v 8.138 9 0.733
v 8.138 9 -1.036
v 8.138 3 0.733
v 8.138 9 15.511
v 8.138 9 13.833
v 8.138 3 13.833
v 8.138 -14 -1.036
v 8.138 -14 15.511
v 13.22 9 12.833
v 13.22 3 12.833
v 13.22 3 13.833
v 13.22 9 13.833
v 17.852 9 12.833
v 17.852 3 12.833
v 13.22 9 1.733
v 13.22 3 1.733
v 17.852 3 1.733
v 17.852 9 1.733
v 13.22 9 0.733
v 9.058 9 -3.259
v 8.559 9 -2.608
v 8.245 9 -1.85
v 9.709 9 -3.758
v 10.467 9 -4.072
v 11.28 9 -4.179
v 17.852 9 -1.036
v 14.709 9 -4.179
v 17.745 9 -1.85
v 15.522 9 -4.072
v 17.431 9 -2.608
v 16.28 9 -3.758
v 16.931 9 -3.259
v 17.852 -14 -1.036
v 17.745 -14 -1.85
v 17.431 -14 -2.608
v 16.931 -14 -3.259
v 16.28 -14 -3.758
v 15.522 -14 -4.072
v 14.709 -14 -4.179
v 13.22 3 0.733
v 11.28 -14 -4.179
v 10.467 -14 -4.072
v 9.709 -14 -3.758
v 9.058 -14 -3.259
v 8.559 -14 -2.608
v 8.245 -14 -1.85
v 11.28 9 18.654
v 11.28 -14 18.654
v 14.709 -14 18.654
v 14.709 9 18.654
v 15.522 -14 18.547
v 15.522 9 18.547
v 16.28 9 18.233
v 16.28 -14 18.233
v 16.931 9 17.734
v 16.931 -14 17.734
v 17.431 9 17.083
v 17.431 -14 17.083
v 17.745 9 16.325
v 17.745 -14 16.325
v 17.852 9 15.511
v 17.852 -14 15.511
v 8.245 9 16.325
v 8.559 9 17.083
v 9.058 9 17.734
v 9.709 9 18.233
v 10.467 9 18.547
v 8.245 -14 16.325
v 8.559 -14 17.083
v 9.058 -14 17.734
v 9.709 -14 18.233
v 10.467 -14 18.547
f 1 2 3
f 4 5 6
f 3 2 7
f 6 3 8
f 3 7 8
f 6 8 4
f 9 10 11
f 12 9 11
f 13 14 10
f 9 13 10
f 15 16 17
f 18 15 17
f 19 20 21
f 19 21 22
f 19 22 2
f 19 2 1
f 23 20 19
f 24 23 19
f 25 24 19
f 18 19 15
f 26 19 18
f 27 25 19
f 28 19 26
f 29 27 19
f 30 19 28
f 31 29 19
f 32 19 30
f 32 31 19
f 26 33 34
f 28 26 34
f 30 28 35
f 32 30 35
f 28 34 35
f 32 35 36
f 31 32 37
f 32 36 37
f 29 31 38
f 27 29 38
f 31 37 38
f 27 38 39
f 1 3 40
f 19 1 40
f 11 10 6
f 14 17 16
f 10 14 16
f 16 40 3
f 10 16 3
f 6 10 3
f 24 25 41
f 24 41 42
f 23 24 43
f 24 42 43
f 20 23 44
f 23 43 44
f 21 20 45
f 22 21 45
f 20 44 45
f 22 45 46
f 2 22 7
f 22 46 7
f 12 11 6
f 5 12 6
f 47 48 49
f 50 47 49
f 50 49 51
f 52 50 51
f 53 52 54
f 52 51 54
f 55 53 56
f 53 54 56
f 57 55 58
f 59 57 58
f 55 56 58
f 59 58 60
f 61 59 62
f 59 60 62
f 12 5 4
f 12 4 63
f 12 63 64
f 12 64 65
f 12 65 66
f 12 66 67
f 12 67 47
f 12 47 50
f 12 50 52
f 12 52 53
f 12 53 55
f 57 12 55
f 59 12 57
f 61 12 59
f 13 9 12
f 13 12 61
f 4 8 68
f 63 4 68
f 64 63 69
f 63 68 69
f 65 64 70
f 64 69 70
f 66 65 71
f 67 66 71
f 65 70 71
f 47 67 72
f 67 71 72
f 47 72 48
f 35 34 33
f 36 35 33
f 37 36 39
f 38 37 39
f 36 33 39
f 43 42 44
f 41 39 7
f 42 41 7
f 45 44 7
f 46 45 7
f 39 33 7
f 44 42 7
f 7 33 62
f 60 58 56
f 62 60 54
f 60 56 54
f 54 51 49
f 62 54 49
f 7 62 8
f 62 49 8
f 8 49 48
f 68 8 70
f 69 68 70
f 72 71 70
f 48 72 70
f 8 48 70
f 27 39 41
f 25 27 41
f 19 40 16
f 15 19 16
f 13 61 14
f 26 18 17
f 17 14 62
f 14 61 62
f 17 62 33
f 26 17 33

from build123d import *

# Parameters (mm, degrees)
CROQUIS1_R                 = 2.4
SALIENTE_EXTRUIR1_DEPTH    = 3
SALIENTE_EXTRUIR2_DEPTH    = 6
CORTAR_EXTRUIR4_DEPTH      = 48.064644057
CORTAR_EXTRUIR4_DEPTH_BACK = 3
SALIENTE_EXTRUIR3_START    = 14
SALIENTE_EXTRUIR3_DEPTH    = 14


with BuildPart() as part:
    # Croquis1 → Saliente-Extruir1 (new body)
    with BuildSketch(Plane(origin=(0, 0, 0), x_dir=(1, 0, 0), z_dir=(0, 1, 0))):
        with BuildLine():
            Line((35.117506554, -10.768616799), (17.851894103, -10.768616799))
            Line((17.851894103, -10.768616799), (17.851894103, -15.511473942))
            ThreePointArc((17.851894103, -15.511473942), (16.931372558, -17.73380954), (14.70903696, -18.654331085))
            Line((14.70903696, -18.654331085), (11.280465531, -18.654331085))
            ThreePointArc((11.280465531, -18.654331085), (9.058129933, -17.73380954), (8.137608389, -15.511473942))
            Line((8.137608389, -15.511473942), (8.137608389, 1.036415275))
            ThreePointArc((8.137608389, 1.036415275), (9.058129933, 3.258750873), (11.280465531, 4.179272418))
            Line((11.280465531, 4.179272418), (14.70903696, 4.179272418))
            ThreePointArc((14.70903696, 4.179272418), (16.931372558, 3.258750873), (17.851894103, 1.036415275))
            Line((17.851894103, 1.036415275), (17.851894103, -3.797188228))
            Line((17.851894103, -3.797188228), (35.117506554, -3.797188228))
            ThreePointArc((35.117506554, -3.797188228), (42.791315147, -7.282902513), (35.117506554, -10.768616799))
        make_face()
        with Locations(Location((38.162743718, -7.282902513, 0), (0, 0, 270))):
            Circle(CROQUIS1_R, mode=Mode.SUBTRACT)
    extrude(amount=SALIENTE_EXTRUIR1_DEPTH)

    # Croquis2 → Saliente-Extruir2 (add)
    with BuildSketch(Plane(origin=(0, 3, 0), x_dir=(1, 0, 0), z_dir=(0, 1, 0))):
        with BuildLine():
            Line((13.22040734, -0.732902513), (13.22040734, -1.732902513))
            Line((13.22040734, -1.732902513), (17.851894103, -1.732902513))
            Line((17.851894103, -1.732902513), (17.851894103, 1.036415275))
            ThreePointArc((17.851894103, 1.036415275), (16.931372558, 3.258750873), (14.70903696, 4.179272418))
            Line((14.70903696, 4.179272418), (11.280465531, 4.179272418))
            ThreePointArc((11.280465531, 4.179272418), (9.058129933, 3.258750873), (8.137608389, 1.036415275))
            Line((8.137608389, 1.036415275), (8.137608389, -0.732902513))
            Line((8.137608389, -0.732902513), (13.22040734, -0.732902513))
        make_face()
        with BuildLine():
            Line((17.851894103, -12.832902513), (13.22040734, -12.832902513))
            Line((13.22040734, -12.832902513), (13.22040734, -13.832902513))
            Line((13.22040734, -13.832902513), (8.137608389, -13.832902513))
            Line((8.137608389, -13.832902513), (8.137608389, -15.511473942))
            ThreePointArc((8.137608389, -15.511473942), (9.058129933, -17.73380954), (11.280465531, -18.654331085))
            Line((11.280465531, -18.654331085), (14.70903696, -18.654331085))
            ThreePointArc((14.70903696, -18.654331085), (16.931372558, -17.73380954), (17.851894103, -15.511473942))
            Line((17.851894103, -15.511473942), (17.851894103, -12.832902513))
        make_face()
    extrude(amount=SALIENTE_EXTRUIR2_DEPTH)

    # Croquis3 → Cortar-Extruir4 (cut, two sides: drawn at the far end of the back side and taken through both)
    with BuildSketch(Plane(origin=(0, 3, 0), x_dir=(1, 0, 0), z_dir=(0, 1, 0)).offset(-CORTAR_EXTRUIR4_DEPTH_BACK)):
        Polygon((17.851894103, 64.354823399), (17.851894103, -3.797188228), (17.851894103, -10.768616799), (17.851894103, -78.920628426), (154.155917357, -78.920628426), (154.155917357, 64.354823399), align=None)
    extrude(amount=CORTAR_EXTRUIR4_DEPTH + CORTAR_EXTRUIR4_DEPTH_BACK, mode=Mode.SUBTRACT)

    # Croquis4 → Saliente-Extruir3 (add)
    with BuildSketch(Plane.XZ.offset(SALIENTE_EXTRUIR3_START)):
        with BuildLine():
            Line((17.851894103, 15.511473942), (17.851894103, -1.036415275))
            ThreePointArc((17.851894103, -1.036415275), (16.931372558, -3.258750873), (14.70903696, -4.179272418))
            Line((14.70903696, -4.179272418), (11.280465531, -4.179272418))
            ThreePointArc((11.280465531, -4.179272418), (9.058129933, -3.258750873), (8.137608389, -1.036415275))
            Line((8.137608389, -1.036415275), (8.137608389, 15.511473942))
            ThreePointArc((8.137608389, 15.511473942), (9.058129933, 17.73380954), (11.280465531, 18.654331085))
            Line((11.280465531, 18.654331085), (14.70903696, 18.654331085))
            ThreePointArc((14.70903696, 18.654331085), (16.931372558, 17.73380954), (17.851894103, 15.511473942))
        make_face()
    extrude(amount=-SALIENTE_EXTRUIR3_DEPTH)


solid = part.part
